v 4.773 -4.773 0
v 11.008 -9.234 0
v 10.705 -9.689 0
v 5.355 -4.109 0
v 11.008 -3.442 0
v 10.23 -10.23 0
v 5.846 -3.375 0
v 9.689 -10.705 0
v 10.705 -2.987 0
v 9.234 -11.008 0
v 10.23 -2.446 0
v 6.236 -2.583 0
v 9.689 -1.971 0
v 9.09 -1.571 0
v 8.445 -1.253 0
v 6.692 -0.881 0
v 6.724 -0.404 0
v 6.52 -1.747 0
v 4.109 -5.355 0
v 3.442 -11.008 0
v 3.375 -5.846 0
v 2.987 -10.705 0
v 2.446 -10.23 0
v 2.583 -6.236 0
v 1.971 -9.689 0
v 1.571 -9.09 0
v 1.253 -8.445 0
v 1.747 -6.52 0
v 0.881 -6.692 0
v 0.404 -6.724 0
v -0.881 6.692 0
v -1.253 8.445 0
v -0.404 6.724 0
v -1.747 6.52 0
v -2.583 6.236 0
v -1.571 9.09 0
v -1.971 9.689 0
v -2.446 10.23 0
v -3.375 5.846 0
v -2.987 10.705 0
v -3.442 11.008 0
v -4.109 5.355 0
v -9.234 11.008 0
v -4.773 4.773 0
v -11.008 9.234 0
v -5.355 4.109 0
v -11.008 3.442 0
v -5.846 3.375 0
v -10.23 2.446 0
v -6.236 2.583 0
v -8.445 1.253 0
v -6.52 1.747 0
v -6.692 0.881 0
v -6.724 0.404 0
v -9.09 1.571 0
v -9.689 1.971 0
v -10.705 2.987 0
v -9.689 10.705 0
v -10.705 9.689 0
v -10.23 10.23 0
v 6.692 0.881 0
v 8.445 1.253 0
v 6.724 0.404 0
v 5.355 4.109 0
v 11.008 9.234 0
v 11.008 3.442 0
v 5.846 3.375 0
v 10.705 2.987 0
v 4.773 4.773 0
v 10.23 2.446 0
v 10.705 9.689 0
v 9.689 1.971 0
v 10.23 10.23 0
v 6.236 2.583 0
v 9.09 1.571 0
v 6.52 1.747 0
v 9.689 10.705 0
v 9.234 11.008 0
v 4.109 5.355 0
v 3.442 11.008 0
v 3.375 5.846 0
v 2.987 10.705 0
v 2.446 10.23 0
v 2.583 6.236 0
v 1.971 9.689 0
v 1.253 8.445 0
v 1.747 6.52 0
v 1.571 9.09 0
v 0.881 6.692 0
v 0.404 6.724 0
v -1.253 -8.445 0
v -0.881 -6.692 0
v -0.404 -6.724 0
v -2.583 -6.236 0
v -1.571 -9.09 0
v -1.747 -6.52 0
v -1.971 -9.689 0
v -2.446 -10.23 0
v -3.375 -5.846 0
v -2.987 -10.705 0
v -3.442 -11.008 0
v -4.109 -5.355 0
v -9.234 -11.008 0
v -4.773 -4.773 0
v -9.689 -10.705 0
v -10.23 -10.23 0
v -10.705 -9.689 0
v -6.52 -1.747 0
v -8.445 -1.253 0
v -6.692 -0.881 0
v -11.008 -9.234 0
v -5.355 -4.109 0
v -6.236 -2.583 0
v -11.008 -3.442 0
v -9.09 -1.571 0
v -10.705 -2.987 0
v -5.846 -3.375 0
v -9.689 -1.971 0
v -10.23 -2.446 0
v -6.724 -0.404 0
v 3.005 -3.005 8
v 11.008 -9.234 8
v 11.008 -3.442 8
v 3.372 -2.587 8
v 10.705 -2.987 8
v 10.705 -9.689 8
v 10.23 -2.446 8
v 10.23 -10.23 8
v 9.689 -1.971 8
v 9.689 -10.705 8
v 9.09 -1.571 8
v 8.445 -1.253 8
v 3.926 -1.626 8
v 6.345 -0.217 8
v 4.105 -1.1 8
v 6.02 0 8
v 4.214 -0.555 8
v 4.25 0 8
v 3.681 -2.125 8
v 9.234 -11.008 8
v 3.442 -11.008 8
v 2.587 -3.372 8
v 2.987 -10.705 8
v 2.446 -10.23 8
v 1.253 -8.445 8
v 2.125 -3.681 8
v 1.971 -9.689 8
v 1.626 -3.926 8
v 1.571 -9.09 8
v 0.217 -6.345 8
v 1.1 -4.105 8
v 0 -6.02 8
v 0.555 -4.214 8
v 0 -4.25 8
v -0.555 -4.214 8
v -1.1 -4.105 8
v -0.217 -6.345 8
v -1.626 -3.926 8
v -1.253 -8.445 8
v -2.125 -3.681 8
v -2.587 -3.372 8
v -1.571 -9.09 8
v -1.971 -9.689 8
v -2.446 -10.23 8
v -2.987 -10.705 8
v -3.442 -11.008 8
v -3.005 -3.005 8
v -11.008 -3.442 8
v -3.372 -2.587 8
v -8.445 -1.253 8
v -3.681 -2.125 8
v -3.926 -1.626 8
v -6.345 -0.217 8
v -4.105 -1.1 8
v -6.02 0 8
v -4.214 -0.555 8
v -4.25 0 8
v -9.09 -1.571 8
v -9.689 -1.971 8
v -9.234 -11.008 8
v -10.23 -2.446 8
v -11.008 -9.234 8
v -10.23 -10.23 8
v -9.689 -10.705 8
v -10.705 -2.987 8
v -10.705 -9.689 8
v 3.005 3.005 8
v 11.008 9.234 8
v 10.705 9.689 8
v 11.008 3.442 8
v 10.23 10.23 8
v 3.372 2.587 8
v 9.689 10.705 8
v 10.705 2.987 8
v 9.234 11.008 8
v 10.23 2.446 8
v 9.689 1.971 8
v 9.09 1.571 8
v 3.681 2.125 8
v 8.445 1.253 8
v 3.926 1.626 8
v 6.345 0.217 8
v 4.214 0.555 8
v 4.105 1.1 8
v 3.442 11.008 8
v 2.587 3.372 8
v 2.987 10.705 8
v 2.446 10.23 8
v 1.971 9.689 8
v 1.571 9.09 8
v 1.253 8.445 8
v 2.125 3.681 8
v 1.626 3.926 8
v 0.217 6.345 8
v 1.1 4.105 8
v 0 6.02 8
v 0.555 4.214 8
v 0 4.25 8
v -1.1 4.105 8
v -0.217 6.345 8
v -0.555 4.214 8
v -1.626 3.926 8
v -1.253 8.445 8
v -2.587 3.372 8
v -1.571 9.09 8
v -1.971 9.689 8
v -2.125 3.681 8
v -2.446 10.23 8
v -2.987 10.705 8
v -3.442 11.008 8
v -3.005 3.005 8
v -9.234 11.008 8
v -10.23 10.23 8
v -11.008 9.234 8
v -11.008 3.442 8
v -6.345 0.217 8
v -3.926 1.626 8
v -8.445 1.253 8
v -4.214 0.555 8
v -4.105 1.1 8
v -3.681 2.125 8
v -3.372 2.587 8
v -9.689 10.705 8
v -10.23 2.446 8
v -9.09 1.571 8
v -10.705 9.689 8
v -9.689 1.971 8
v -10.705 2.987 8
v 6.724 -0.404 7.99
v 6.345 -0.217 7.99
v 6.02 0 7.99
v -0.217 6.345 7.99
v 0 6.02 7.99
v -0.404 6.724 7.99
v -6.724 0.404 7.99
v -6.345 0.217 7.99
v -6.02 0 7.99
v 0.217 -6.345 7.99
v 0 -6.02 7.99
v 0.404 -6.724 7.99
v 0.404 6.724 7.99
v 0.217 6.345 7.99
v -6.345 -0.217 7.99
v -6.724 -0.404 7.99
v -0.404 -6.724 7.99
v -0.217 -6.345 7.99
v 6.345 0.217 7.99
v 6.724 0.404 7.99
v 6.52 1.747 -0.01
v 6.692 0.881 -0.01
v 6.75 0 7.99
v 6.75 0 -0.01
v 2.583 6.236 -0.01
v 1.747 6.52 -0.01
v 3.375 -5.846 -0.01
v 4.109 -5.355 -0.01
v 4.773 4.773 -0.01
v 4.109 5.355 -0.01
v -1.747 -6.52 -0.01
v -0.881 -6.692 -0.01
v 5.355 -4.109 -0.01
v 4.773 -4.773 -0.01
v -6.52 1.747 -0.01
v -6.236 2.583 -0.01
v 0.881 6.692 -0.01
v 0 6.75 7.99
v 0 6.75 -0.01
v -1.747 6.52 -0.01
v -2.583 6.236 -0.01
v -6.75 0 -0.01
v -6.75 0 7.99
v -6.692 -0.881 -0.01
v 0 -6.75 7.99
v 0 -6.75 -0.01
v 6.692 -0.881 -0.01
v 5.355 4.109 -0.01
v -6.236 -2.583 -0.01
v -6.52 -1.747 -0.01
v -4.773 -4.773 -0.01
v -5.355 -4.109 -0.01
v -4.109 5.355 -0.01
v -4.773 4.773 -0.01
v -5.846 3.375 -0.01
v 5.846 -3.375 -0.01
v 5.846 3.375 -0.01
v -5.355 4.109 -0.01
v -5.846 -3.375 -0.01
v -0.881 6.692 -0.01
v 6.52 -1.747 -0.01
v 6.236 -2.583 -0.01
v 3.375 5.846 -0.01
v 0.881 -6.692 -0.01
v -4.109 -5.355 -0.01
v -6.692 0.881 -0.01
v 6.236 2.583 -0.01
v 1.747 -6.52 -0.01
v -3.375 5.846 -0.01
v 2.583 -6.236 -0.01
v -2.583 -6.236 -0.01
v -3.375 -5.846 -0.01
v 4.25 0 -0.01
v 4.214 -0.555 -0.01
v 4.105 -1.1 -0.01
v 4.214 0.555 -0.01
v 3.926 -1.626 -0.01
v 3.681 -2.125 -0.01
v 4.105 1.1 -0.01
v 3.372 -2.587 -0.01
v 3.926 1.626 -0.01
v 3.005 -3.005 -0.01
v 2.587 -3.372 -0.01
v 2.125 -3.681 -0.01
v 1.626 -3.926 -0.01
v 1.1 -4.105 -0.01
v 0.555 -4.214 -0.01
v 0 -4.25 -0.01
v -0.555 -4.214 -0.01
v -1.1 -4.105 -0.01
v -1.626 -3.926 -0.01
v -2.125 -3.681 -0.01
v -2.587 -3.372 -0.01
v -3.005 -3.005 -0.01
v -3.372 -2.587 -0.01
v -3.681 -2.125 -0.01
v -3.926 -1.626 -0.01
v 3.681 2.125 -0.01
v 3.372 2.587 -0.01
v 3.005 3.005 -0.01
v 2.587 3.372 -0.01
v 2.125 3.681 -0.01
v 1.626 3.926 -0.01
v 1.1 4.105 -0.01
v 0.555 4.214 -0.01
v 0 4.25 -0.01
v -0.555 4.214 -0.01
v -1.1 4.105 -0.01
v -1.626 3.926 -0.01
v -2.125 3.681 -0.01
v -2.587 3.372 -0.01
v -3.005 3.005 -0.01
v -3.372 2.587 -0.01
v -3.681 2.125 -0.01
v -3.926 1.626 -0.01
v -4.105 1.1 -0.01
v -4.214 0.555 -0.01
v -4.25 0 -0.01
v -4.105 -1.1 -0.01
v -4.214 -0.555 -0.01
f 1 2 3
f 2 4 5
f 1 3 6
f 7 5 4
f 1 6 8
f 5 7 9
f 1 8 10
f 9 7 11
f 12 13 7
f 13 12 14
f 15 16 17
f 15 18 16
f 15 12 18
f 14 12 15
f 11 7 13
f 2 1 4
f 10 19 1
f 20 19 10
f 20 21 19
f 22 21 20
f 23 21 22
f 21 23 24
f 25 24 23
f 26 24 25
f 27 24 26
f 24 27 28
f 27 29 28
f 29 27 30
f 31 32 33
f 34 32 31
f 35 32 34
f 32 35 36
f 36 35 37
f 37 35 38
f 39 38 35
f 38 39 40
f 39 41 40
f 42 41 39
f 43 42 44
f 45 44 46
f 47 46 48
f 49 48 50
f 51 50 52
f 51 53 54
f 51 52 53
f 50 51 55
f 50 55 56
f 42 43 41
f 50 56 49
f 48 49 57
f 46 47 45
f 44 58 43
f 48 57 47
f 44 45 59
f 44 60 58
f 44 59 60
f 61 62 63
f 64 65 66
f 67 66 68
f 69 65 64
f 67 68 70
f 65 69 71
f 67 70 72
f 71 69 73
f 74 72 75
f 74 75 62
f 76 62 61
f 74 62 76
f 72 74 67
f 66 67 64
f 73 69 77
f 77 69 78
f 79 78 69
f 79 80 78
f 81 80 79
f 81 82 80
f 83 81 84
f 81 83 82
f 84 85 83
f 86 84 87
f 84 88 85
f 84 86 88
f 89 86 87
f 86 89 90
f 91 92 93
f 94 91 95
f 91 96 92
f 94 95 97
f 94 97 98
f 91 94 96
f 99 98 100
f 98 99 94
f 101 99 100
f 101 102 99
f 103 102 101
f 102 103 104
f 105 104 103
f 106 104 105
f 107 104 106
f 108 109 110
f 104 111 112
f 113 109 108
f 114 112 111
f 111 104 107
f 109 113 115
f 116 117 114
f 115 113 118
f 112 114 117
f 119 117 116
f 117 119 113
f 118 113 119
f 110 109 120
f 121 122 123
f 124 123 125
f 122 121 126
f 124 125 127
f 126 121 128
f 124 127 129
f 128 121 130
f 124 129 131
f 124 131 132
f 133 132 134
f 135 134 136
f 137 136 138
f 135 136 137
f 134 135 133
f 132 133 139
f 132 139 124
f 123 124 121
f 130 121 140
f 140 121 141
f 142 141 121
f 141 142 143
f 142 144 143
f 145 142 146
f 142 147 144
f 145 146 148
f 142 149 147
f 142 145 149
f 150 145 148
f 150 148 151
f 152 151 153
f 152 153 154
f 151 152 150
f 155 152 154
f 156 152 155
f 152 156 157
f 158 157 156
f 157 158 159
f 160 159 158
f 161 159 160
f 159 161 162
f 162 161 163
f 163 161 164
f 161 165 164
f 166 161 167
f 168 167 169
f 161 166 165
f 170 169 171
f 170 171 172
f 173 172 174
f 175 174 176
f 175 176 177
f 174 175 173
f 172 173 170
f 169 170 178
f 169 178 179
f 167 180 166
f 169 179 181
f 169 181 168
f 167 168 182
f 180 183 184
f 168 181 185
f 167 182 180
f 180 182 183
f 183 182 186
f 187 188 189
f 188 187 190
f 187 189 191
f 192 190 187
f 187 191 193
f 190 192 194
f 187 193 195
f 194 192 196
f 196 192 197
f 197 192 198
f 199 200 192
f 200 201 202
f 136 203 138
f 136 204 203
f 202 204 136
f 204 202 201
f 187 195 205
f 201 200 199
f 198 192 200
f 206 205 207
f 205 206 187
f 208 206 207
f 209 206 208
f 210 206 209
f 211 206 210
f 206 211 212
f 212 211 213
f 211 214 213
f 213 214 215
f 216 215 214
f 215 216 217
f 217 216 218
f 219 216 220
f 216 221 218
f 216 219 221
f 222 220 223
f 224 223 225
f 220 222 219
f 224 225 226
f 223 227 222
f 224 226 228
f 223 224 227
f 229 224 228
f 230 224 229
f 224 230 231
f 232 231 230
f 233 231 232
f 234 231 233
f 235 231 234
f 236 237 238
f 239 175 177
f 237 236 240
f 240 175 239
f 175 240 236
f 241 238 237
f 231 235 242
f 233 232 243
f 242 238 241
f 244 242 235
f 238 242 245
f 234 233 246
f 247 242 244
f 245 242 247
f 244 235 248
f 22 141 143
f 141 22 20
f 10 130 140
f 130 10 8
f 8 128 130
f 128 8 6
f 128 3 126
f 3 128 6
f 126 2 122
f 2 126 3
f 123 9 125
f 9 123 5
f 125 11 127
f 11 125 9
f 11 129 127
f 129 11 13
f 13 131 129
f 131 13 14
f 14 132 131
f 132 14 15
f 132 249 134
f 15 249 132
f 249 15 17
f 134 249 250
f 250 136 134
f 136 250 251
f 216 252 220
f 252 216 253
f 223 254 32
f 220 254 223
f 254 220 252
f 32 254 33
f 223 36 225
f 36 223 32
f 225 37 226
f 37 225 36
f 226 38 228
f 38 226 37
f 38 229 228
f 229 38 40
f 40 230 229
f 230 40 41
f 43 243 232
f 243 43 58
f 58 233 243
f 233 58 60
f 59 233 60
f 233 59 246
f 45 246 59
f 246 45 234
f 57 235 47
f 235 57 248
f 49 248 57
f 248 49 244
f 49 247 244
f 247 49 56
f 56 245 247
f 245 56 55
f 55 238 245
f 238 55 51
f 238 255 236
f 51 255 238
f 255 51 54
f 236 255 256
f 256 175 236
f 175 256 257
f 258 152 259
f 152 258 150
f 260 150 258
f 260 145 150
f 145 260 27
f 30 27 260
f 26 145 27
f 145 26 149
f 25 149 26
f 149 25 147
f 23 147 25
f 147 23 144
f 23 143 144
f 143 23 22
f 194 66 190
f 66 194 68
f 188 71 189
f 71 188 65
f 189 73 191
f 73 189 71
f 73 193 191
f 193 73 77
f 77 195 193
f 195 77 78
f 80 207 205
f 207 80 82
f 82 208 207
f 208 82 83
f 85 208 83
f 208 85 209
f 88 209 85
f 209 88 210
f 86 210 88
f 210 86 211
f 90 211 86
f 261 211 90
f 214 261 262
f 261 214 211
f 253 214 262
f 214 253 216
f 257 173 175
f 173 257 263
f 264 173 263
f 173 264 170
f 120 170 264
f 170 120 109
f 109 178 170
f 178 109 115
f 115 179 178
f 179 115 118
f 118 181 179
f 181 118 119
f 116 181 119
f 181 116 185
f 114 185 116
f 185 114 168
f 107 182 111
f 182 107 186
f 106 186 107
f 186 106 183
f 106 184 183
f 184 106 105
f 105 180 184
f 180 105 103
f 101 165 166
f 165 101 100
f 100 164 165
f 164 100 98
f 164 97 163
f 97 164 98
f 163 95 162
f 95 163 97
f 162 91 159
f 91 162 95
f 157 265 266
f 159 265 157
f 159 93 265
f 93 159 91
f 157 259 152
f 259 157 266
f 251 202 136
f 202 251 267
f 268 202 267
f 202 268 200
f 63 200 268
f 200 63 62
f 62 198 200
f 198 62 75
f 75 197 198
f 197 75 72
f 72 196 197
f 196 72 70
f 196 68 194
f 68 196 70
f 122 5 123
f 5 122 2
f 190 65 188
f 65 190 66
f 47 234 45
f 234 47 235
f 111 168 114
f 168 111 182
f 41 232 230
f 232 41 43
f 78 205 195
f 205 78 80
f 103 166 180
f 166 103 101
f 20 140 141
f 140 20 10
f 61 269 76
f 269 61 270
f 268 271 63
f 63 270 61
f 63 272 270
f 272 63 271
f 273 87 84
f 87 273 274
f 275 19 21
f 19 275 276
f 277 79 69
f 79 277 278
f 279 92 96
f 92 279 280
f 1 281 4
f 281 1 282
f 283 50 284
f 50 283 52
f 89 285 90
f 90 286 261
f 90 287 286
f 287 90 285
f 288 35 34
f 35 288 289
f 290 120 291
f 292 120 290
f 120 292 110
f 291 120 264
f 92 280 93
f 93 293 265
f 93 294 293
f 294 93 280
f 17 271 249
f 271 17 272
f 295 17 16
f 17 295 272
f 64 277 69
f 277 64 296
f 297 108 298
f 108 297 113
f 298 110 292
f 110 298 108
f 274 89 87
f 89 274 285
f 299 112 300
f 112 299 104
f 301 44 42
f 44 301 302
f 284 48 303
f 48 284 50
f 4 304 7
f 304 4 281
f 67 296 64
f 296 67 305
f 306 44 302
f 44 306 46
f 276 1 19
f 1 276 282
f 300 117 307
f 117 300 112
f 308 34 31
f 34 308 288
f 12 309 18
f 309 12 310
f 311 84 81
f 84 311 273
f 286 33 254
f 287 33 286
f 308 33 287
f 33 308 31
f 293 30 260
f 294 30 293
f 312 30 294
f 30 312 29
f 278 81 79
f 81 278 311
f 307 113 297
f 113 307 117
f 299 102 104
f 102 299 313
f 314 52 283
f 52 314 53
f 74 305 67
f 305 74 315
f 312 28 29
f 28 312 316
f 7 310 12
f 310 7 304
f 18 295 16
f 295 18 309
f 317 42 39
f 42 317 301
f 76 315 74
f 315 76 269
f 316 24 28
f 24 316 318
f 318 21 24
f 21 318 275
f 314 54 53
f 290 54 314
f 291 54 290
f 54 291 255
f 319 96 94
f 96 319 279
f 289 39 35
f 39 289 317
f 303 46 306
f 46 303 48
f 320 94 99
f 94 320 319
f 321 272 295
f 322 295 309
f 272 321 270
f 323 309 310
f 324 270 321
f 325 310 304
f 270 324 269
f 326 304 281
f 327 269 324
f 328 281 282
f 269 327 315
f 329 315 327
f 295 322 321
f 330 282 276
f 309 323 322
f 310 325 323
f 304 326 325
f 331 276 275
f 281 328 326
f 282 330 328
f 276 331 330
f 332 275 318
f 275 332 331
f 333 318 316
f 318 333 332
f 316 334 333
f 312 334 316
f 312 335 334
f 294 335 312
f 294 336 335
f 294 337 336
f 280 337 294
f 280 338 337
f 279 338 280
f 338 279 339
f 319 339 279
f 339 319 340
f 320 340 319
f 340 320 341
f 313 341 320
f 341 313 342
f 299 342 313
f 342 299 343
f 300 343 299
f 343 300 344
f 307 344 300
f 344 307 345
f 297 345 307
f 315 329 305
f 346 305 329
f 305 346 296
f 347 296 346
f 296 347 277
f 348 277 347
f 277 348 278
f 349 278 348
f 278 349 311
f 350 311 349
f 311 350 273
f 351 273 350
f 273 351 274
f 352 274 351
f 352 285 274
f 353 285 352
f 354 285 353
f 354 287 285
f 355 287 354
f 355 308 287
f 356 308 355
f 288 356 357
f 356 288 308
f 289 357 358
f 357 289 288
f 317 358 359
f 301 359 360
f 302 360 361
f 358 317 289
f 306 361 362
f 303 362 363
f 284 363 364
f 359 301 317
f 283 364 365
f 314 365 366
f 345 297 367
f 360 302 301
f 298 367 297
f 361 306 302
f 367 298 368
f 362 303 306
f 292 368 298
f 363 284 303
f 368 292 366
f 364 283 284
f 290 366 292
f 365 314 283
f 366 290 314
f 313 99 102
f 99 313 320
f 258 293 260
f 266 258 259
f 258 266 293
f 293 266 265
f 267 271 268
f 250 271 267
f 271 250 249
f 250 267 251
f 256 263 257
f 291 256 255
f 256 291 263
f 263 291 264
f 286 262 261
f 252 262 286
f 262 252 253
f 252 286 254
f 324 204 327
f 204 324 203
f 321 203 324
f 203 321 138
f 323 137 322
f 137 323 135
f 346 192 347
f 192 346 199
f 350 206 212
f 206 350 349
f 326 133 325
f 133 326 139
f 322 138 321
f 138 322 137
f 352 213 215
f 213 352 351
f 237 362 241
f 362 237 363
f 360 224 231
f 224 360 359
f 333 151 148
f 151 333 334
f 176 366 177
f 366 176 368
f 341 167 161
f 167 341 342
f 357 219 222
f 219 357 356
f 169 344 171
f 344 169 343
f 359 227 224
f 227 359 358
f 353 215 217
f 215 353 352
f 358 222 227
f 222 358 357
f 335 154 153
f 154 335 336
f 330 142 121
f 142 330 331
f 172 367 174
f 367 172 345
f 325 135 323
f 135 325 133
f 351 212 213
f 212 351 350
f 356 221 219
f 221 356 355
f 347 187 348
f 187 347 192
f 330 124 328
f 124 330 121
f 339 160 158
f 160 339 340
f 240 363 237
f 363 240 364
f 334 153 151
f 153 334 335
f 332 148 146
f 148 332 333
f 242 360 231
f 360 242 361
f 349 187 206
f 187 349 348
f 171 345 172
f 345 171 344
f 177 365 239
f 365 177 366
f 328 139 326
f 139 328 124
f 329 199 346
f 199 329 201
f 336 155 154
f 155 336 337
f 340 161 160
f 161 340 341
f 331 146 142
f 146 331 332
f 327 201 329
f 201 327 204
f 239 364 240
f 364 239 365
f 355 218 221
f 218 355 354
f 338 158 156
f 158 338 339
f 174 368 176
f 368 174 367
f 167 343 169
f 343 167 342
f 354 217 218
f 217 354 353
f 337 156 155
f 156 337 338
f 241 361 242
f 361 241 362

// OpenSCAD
// file: teardrop.scad
teardrop();

module teardrop (r=4.5,h=20,top_and_bottom=false)
{
	rotate([-270,0,90])
	linear_extrude(height=h,convexity=10)
	{
		circle(r=r);
		polygon(points=[[0,0],[r*cos(30),r*sin(30)],[0.5*r,r],[-0.5*r,r],[-r*cos(30),r*sin(30)]],
				paths=[[0,1,2,3,4]]);
		if (top_and_bottom)
		polygon(points=[[0,0],[r*cos(30),-r*sin(30)],[0.5*r,-r],[-0.5*r,-r],[-r*cos(30),-r*sin(30)]],
				paths=[[0,1,2,3,4]]);
		
	}
}

module teardropcentering (r=4.5,h=20)
{
	rotate([-270,0,90])
	linear_extrude(height=h)
	{
		circle(r=r, $fn = 24);
		polygon(points=[[0,0],[r*cos(30),r*sin(30)],[0.5*r,1.2*r],[-0.5*r,1.2*r],[-r*cos(30),r*sin(30)]],
				paths=[[0,1,2,3,4]]);
	}
}

module teardropcentering2 (r=4.5,h=20)
{
	//rotate([-270,0,90])
	difference(){
	linear_extrude(height=h)
	{
		circle(r=r, $fn = 24);
		polygon(points=[[0,0],[r*cos(30),r*sin(30)],[0.5*r,1.2*r],[-0.5*r,1.2*r],[-r*cos(30),r*sin(30)]],
				paths=[[0,1,2,3,4]]);
	}
	translate(v = [-1.5*r, -1.5*r,-1])cube(size =[3*r,1.5*r,h+2]);
	}
}
// file: barbell.scad
/*
 *  This program is free software; you can redistribute it and/or modify
 *  it under the terms of the GNU General Public License as published by
 *  the Free Software Foundation; either version 3 of the License,
 *  LGPL version 2.1, or (at your option) any later version of the GPL.
 *
 *  This program is distributed in the hope that it will be useful,
 *  but WITHOUT ANY WARRANTY; without even the implied warranty of
 *  MERCHANTABILITY or FITNESS FOR A PARTICULAR PURPOSE.  See the
 *  GNU General Public License for more details.
 *
 *  You should have received a copy of the GNU General Public License
 *  along with this program; if not, write to the Free Software
 *  Foundation, Inc., 59 Temple Place, Suite 330, Boston, MA 02111-1307 USA
 *
*/

module barbell (r1,r2,r3,r4,separation) 
{
	x1=[0,0];
	x2=[separation,0];
	x3=triangulate (x1,x2,r1+r3,r2+r3);
	x4=triangulate (x2,x1,r2+r4,r1+r4);
	render()
	difference ()
	{
		union()
		{
			translate(x1)
			circle (r=r1);
			translate(x2)
			circle(r=r2);
			polygon (points=[x1,x3,x2,x4]);
		}
		translate(x3)
		circle(r=r3,$fa=5);
		translate(x4)
		circle(r=r4,$fa=5);
	}
}


function triangulate (point1, point2, length1, length2) = 
point1 + 
length1*rotated(
atan2(point2[1]-point1[1],point2[0]-point1[0])+
angle(distance(point1,point2),length1,length2));

function distance(point1,point2)=
sqrt((point1[0]-point2[0])*(point1[0]-point2[0])+
(point1[1]-point2[1])*(point1[1]-point2[1]));

function angle(a,b,c) = acos((a*a+b*b-c*c)/(2*a*b)); 

function rotated(a)=[cos(a),sin(a),0];
// file: utilities.scad
/*
 * Utility functions.
 *
 * Originally by Hans Häggström, 2010.
 * Dual licenced under Creative Commons Attribution-Share Alike 3.0 and LGPL2 or later
 */

//include <units.scad>


/******************** Disance Poins ******************************/
function distance3D(a,b) =sqrt( (a[0] - b[0])*(a[0] - b[0]) +
                                (a[1] - b[1])*(a[1] - b[1]) +
                                (a[2] - b[2])*(a[2] - b[2]) );
//Obsolet
function distance(a, b) = distance3D(a,b);

function distance2D(a,b) = sqrt( (a[0] - b[0])*(a[0] - b[0]) +
                                (a[1] - b[1])*(a[1] - b[1]));
								
function distance1D(a,b) = sqrt(a*a+b*b);
//Obsolet
function length2(a) = distance1D(a[0],a[1]);


/************************ vector *************************/
function normalized(a) = a / (max(distance3D([0,0,0], a), 0.00001));

function normalized_axis(a) = a == "x" ? [1, 0, 0]:
                   a == "y" ? [0, 1, 0]:
                   a == "z" ? [0, 0, 1]: normalized(a);

function angleOfNormalizedVector(n) = [0, -atan2(n[2], distance1D([n[0], n[1]])), atan2(n[1], n[0]) ];

function angle(v) = angleOfNormalizedVector(normalized(v));

function angleBetweenTwoPoints(a, b) = angle(normalized(b-a));

function _angleVectore2D(a) = atan2(a[0],a[1]);
function angle_betweentTwoPoints2D (a,b) = _angleVectore2D(b-a);


/********************** Circel ***************************/

function circel_area(r) = PI * r * r;

function circel_radius3Points(a,b,c) = (distance2D(a,b) * distance2D(b,c) * distance2D(c,a)) / (4 * triangle_area3Points(a,b,c));

function circel_radius3lengths(a,b,c) = (a*b*c) / (4 * triangle_area3lengths(a,b,c));


/********************** triangle **************************/
//Satz des Heron
function triangle_area3lengths(a,b,c) = sqrt((a+b+c)*(a+b-c)*(b+c-a)*(c+a-b))/4;

function triangle_area3Points(a,b,c) = triangle_area3lengths(distance2D(a,b),distance2D(b,c),distance2D(c,a));



/************************** coordinate systems translation ****/
//[radius,phi] <=> [x,y]
function conv2D_cartesian2polar(x) = [ distance1D(x[0],x[1]) , atan2(x[1],x[0]) ];
function conv2D_polar2cartesian(x) = [ x[0]*cos(x[1]) , x[0]*sin(x[1]) ];


CENTER = 0;
LEFT = -0.5;
RIGHT = 0.5;
TOP = 0.5;
BOTTOM = -0.5;

FlatCap =0;
ExtendedCap =0.5;
CutCap =-0.5;


module fromTo(from=[0,0,0], to=[1,0,0], size=[1, 1], align=[CENTER, CENTER], material=[0.5, 0.5, 0.5], name="", endExtras=[0,0], endCaps=[FlatCap, FlatCap], rotation=[0,0,0], printString=true) {

  angle = angleBetweenTwoPoints(from, to);
  length = distance(from, to) + endCaps[0]*size[0] + endCaps[1]*size[0] + endExtras[0] + endExtras[1];

  if (length > 0) {
    if (printString) echo(str( "  " ,name, " ", size[0], "mm x ", size[1], "mm, length ", length, "mm"));

    color(material)
      translate(from)
        rotate(angle)
          translate( [ -endCaps[0]*size[0] - endExtras[0], size[0]*(-0.5-align[0]), size[1]*(-0.5+align[1]) ] )
            rotate(rotation)
              scale([length, size[0], size[1]]) child();
  }
}

module part(name) {
  echo("");
  echo(str(name, ":"));
}
// file: roundEdges.scad
/*
 *  Copyright (C) 2012  Krallinger Sebastian
 *
 *  This program is free software; you can redistribute it and/or modify
 *  it under the terms of the GNU General Public License as published by
 *  the Free Software Foundation; either version 3 of the License,
 *  LGPL version 2.1, or (at your option) any later version of the GPL.
 *
 *  This program is distributed in the hope that it will be useful,
 *  but WITHOUT ANY WARRANTY; without even the implied warranty of
 *  MERCHANTABILITY or FITNESS FOR A PARTICULAR PURPOSE.  See the
 *  GNU General Public License for more details.
 *
 *  You should have received a copy of the GNU General Public License
 *  along with this program; if not, write to the Free Software
 *  Foundation, Inc., 59 Temple Place, Suite 330, Boston, MA 02111-1307 USA
 *
*/


//Rounded Edges
module roundEdge(_a=0,_r=1,_l=1,_fn=100){
	rotate (a=[0,0,_a]){
		translate(v=[_r,_r,0]){
			rotate (a=[0,0,0]) rotate (a=[0,0,180]){
				difference() {
					translate (v=[-OS/2,-OS/2,-OS/2])
						cube (size = [_r+OS,_r+OS,_l+OS],center=false );
					translate (v=[0,0,-OS*2/2])
						cylinder (h = _l+OS*2, r=_r, center = false, $fn=_fn);
				}
			}
		}
	}
}
//roundEdge(_a=0,_l=10);
// file: metric.scad
// PRUSA Mendel  
// Default metric sizes
// GNU GPL v2
// Josef Průša
// josefprusa@me.com
// prusadjs.cz
// http://www.reprap.org/wiki/Prusa_Mendel
// http://github.com/prusajr/PrusaMendel

// RODS

threaded_rod_diameter = 8.2;
smooth_bar_diameter = 8;

// Nuts and bolts
// For all nuttraps and screw holse 
m8_diameter = 8.9;
m8_nut_diameter = 15.3;
m8_nut_wallDist = _wallDistFromDia(m8_nut_diameter);
m8_nut_heigth = 6.3;

m4_diameter = 4.5;
m4_nut_diameter = 8.1;
m4_nut_heigth = 3.2;

m3_diameter = 3.6;
m3_nut_diameter = 6.45;
m3_nut_heigth = 2.3;
m3_nut_wallDist = _wallDistFromDia(m3_nut_diameter);
m3_nut_diameter_horizontal = 6.1;

// elongetaed nuttraps
// where a nut is put in an slot and inthere hits the perpendicular threadhole
m3_elongNtt_tolerance = [0.5,0,0.5];// additional [diameter,depth,height]  // depth is not implemented

// linear Bearings
lber_length = 24;
lber_diam = 15.3;

// Motors

motor_shaft = 5.5;


/******************************************************************************/ 
/*                                  INTERNAL                                  */
/******************************************************************************/
/*-----------------!!! do not change things below this !!!--------------------*/
m3_elongNtt_diameter = m3_nut_diameter + m3_elongNtt_tolerance[0];
m3_elongNtt_wallDist = _wallDistFromDia(m3_elongNtt_diameter);
m3_elongNtt_height = m3_nut_heigth + m3_elongNtt_tolerance[2];



function _wallDistFromDia(dia) = cos(30)*dia;
// file: units.scad
/*
 * Basic units.
 * 
 * Originally by Hans Häggström, 2010.
 * Dual licenced under Creative Commons Attribution-Share Alike 3.0 and LGPL2 or later
 */


mm = 1;
cm = 10 * mm;
dm = 100 * mm;
m = 1000 * mm;

inch = 25.4 * mm;

X = [1, 0, 0];
Y = [0, 1, 0];
Z = [0, 0, 1];

M3 = 3*mm;
M4 = 4*mm;
M5 = 5*mm;
M6 = 6*mm;
M8 = 8*mm;


// When a small distance is needed to overlap shapes for boolean cutting, etc.
epsilon = 0.01*mm;
OS = epsilon;  // Over size
// main file
/* pRb-Y-supportFootEnd
 * Copyright (c) 2012 by Krallinger Sebastian [s.krallinger+cc@gmail.com]
 * 
 * Creative Commons Attribution-ShareAlike 3.0 (CC BY-SA) [http://creativecommons.org/licenses/by-sa/3.0/]
 * original desing by abdrumm for the PrintrBot
 */

include <units.scad>;
include <metric.scad>
include <roundEdges.scad>
include <utilities.scad>
include <barbell.scad>
use <teardrop.scad>


/*------------------------------------general---------------------------------*/
mode = "print";  // can be print or inspect [overlays the model with the original model] (uncomment next line)
mode = "inspect";
$fn=48;

thinWallThickness          = 1;
genWallThickness           = 2.5;
strongWallThickness        = 8;

horizontalSuportThickness  = 0.3;
verticalSupportThickness   = 0.5;

/*------------------------------------rod-------------------------------------*/
roughRod_diam                   = 8.5;

/*------------------------------------supportFootEnd--------------------------*/
sFooEnd_size = [8.267+roughRod_diam*1.5+1,8.267+roughRod_diam*1.5+1,strongWallThickness];



/******************************************************************************/ 
/*                                  INTERNAL                                  */
/******************************************************************************/
_acrossStrive_angle = atan(sFooEnd_size[0]/sFooEnd_size[1]);
_acrossStrive_diam = min(sFooEnd_size[0],sFooEnd_size[1])/4;
_acrossStrive_length = distance1D(sFooEnd_size[0],sFooEnd_size[1])-_acrossStrive_diam*2.4;

module  pRb_Y_supportFootEnd() {
	difference() {
		union(){
			translate([0, 0, -OS]) 
				cylinder(r=roughRod_diam/2+genWallThickness, h=sFooEnd_size[2], center=false);

			intersection() {
			translate([0, 0, sFooEnd_size[2]/2]) 
				cube(size=sFooEnd_size, center=true);

			for (i=[0,1])
			rotate(a=90*i-_acrossStrive_angle,v=Z) 
			translate([-_acrossStrive_length/2, 0, 0]) 
			linear_extrude(height=sFooEnd_size[2])
				barbell (r1=_acrossStrive_diam,r2=_acrossStrive_diam,r3=_acrossStrive_length,r4=_acrossStrive_length,separation=_acrossStrive_length);
			}
		}
		union(){
			translate([0, 0, -OS]) 
				cylinder(r=roughRod_diam/2, h=sFooEnd_size[2]+2*OS, center=false);
		}
	}
	

}


if (mode == "inspect") {
	 pRb_Y_supportFootEnd();
}
module pRb_Y_supportFootEnd_print() {
	pRb_Y_supportFootEnd();
}
if (mode == "print") {
	pRb_Y_supportFootEnd_print();
}
